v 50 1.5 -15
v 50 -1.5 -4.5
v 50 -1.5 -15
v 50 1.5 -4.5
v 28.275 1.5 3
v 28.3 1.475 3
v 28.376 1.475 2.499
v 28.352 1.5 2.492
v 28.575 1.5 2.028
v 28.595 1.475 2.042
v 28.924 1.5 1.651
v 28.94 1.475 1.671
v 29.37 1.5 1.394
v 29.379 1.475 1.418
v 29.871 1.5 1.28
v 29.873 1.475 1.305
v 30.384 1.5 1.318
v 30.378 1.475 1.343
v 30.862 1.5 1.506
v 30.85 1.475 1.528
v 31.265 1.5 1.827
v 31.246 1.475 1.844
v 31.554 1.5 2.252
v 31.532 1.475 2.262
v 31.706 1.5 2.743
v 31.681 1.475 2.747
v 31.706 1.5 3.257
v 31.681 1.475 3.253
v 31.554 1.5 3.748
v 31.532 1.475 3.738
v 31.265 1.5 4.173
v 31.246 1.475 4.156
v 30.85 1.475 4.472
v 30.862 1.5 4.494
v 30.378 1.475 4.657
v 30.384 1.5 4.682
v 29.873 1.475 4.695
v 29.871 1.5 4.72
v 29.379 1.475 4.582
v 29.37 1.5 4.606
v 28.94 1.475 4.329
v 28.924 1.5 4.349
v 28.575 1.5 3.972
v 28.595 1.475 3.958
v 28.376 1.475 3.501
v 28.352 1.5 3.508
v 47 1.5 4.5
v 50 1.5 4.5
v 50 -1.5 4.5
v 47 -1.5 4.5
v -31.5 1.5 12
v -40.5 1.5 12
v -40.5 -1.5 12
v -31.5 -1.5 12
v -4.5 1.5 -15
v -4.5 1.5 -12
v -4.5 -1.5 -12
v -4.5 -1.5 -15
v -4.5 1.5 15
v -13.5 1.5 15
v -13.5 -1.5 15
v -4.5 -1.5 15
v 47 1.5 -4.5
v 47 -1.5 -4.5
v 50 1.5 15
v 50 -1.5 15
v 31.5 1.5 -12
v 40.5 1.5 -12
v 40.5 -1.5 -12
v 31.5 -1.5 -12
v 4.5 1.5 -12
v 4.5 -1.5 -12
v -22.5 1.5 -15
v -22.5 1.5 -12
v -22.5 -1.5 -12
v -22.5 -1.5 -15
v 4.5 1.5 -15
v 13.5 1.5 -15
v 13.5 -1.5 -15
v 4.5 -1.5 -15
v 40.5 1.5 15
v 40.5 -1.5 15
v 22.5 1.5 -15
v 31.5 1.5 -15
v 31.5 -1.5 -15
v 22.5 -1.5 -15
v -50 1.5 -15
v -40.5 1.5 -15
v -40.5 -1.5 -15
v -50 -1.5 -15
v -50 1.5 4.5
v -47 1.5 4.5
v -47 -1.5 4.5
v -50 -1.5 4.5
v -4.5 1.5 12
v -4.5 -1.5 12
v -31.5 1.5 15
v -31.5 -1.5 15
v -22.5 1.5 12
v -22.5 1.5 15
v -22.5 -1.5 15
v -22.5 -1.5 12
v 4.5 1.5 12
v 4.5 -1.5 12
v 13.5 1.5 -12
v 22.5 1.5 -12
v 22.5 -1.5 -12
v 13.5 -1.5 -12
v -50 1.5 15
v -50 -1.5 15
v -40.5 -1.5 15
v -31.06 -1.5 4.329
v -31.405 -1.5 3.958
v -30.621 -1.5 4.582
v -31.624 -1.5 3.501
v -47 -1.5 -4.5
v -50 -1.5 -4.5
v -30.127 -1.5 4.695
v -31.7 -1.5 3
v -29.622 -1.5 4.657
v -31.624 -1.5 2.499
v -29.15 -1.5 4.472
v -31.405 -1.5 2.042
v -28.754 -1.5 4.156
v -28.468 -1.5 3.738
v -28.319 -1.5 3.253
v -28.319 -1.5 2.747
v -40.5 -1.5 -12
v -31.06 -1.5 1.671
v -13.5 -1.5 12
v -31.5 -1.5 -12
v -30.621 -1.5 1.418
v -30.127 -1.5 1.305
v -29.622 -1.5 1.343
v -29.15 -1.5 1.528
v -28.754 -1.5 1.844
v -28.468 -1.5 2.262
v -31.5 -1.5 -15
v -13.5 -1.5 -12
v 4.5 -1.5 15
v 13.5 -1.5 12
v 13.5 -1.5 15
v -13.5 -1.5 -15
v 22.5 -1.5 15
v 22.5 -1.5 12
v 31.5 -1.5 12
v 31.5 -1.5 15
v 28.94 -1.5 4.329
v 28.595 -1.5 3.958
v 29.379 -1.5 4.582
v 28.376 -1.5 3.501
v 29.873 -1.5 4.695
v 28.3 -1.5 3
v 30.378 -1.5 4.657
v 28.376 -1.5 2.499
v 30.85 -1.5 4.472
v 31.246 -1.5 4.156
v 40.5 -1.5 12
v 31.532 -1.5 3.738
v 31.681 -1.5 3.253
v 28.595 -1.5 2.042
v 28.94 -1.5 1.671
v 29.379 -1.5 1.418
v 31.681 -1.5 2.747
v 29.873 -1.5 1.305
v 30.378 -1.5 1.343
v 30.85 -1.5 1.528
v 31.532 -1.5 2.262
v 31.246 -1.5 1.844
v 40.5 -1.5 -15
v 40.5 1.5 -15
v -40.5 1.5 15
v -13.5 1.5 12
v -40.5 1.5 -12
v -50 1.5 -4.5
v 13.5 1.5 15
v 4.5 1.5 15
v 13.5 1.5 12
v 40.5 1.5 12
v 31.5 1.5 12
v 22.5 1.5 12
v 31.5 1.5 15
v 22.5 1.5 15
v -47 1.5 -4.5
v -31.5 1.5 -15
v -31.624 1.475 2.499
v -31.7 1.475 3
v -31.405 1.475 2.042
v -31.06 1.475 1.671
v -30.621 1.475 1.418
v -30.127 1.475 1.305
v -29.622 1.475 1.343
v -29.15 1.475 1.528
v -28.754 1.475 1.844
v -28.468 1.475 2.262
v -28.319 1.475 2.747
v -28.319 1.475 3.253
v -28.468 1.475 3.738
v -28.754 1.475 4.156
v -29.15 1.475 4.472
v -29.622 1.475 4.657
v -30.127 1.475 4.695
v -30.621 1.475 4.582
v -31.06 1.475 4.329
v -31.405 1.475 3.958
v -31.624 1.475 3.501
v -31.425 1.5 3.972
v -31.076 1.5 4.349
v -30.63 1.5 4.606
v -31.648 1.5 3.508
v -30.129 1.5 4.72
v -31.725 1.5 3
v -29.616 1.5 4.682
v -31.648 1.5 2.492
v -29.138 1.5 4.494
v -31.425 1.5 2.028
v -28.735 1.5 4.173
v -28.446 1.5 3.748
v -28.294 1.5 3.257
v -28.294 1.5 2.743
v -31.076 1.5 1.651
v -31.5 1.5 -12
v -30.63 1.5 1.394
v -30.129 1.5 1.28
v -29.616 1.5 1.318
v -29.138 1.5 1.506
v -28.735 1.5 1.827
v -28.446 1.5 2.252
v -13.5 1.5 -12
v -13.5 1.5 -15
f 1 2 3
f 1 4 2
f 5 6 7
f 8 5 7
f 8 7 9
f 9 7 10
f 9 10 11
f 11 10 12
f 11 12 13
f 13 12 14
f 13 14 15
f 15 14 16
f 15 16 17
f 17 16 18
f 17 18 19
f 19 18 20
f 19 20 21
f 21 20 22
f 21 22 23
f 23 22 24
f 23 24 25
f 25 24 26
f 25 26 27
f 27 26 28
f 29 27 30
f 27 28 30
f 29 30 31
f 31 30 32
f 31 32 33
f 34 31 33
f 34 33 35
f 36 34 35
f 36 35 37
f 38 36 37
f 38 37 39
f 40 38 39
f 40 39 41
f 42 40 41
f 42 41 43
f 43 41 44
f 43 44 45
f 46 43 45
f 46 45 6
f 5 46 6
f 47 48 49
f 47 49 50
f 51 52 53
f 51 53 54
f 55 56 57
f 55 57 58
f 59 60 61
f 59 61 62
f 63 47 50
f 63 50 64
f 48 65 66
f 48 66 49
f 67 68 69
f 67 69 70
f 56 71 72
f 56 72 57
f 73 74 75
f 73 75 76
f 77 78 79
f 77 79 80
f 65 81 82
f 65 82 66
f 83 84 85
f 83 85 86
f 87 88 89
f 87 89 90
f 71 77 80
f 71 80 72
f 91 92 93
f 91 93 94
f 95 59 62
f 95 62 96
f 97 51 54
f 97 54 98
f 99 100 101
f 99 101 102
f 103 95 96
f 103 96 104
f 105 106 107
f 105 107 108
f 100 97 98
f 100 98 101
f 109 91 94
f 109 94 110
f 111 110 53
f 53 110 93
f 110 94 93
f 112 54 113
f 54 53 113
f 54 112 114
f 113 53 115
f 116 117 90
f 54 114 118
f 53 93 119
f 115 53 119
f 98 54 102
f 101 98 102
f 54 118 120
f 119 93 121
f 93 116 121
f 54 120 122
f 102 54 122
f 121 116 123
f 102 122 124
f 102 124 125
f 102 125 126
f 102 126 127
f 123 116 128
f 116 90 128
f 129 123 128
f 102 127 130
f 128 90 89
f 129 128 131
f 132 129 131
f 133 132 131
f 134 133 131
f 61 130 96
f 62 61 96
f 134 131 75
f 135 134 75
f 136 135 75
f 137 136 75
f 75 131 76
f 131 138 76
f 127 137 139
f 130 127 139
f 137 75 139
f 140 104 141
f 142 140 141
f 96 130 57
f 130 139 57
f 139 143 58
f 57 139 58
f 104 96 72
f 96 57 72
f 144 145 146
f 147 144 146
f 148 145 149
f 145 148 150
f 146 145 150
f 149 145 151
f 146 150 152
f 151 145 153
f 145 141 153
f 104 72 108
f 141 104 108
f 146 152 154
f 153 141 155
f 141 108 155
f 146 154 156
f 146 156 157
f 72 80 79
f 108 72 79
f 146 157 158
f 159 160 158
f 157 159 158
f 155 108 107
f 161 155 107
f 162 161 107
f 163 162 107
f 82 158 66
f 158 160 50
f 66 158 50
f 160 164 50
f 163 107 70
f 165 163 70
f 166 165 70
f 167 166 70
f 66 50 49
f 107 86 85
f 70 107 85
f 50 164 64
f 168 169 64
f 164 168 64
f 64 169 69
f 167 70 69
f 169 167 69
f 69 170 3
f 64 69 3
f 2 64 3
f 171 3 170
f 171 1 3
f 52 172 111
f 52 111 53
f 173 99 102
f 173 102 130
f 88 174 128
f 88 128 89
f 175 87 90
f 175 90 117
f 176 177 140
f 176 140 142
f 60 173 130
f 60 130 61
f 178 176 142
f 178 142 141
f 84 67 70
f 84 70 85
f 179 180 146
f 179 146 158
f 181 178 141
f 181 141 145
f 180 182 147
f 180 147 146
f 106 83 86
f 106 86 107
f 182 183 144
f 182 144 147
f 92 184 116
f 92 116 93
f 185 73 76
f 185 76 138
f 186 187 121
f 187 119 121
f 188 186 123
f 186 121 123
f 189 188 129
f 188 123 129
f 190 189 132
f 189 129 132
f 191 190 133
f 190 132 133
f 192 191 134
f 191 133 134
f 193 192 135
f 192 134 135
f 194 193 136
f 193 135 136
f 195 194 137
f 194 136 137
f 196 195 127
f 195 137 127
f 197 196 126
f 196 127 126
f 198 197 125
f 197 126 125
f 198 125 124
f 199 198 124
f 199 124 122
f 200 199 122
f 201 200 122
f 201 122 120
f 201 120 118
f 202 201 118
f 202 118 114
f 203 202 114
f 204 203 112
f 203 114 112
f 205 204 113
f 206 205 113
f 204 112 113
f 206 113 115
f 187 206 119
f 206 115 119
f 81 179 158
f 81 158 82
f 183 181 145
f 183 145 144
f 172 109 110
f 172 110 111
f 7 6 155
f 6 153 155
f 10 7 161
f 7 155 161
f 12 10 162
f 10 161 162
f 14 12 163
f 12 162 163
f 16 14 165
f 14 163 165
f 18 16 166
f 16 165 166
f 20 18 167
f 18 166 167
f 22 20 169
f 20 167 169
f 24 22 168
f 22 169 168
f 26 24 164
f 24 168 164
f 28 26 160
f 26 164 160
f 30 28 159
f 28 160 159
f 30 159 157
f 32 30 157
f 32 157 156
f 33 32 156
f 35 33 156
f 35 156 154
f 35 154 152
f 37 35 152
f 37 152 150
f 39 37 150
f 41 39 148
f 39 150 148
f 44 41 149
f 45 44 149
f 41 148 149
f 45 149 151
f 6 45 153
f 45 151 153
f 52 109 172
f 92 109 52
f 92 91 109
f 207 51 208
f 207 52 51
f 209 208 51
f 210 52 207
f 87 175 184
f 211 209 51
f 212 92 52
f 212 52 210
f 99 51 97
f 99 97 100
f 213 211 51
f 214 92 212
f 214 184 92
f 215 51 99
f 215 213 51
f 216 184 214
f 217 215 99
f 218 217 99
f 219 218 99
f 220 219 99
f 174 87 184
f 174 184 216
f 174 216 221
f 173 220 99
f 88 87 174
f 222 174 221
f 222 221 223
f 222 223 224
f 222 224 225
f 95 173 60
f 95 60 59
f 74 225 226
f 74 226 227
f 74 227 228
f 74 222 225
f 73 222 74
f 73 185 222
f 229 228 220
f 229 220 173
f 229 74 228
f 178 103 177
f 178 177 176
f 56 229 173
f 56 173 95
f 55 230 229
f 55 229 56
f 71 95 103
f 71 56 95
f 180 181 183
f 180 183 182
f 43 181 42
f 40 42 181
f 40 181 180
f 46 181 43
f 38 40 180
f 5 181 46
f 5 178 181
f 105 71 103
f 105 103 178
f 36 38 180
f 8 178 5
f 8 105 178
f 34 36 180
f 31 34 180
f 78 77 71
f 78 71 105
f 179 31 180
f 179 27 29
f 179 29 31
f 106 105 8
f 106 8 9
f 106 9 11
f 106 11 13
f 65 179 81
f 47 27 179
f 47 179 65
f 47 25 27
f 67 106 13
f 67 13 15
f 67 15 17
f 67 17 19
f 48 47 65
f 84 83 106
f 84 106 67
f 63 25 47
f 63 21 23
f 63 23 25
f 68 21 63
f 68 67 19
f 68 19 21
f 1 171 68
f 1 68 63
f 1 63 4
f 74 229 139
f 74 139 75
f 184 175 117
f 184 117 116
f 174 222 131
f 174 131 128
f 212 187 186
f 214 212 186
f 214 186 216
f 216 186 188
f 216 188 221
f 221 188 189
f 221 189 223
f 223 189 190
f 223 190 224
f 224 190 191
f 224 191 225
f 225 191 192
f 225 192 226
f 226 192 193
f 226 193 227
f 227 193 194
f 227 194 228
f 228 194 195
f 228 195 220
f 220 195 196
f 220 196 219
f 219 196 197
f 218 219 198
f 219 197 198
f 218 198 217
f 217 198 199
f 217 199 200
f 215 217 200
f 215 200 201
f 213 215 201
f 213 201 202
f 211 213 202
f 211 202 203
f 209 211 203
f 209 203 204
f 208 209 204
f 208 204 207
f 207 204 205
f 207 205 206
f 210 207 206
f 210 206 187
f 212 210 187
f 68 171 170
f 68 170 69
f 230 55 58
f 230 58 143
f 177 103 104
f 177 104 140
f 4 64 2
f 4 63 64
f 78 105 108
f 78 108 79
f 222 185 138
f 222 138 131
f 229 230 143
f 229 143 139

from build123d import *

# Parameters (mm, degrees)
BOSS_EXTRUDE1_DEPTH            = 1.5
M3_CLEARANCE_HOLE1_D           = 3.4
M3_CLEARANCE_HOLE1_CSINK_D     = 3.45
M3_CLEARANCE_HOLE1_CSINK_ANGLE = 90


with BuildPart() as part:
    # Sketch1 → Boss-Extrude1 (new, symmetric)
    with BuildSketch(Plane(origin=(0, 0, 0), x_dir=(1, 0, 0), z_dir=(0, 1, 0))):
        Polygon((50, 15), (47, 15), (40.5, 15), (40.5, 12), (31.5, 12), (31.5, 15), (22.5, 15), (22.5, 12), (13.5, 12), (13.5, 15), (4.5, 15), (4.5, 12), (-4.5, 12), (-4.5, 15), (-13.5, 15), (-13.5, 12), (-22.5, 12), (-22.5, 15), (-31.5, 15), (-31.5, 12), (-40.5, 12), (-40.5, 15), (-47, 15), (-50, 15), (-50, 12), (-50, 4.5), (-47, 4.5), (-47, -4.5), (-50, -4.5), (-50, -12), (-50, -15), (-47, -15), (-40.5, -15), (-40.5, -12), (-31.5, -12), (-31.5, -15), (-22.5, -15), (-22.5, -12), (-13.5, -12), (-13.5, -15), (-4.5, -15), (-4.5, -12), (4.5, -12), (4.5, -15), (13.5, -15), (13.5, -12), (22.5, -12), (22.5, -15), (31.5, -15), (31.5, -12), (40.5, -12), (40.5, -15), (47, -15), (50, -15), (50, -12), (50, -4.5), (47, -4.5), (47, 4.5), (50, 4.5), (50, 12), align=None)
    extrude(amount=BOSS_EXTRUDE1_DEPTH, both=True)

    # M3 Clearance Hole1 (through all)
    with Locations(Plane(origin=(0, 1.5, 0), x_dir=(1, 0, 0), z_dir=(0, 1, 0))):
        with Locations((-30, -3), (30, -3)):
            CounterSinkHole(M3_CLEARANCE_HOLE1_D / 2, M3_CLEARANCE_HOLE1_CSINK_D / 2, counter_sink_angle=M3_CLEARANCE_HOLE1_CSINK_ANGLE)


solid = part.part
